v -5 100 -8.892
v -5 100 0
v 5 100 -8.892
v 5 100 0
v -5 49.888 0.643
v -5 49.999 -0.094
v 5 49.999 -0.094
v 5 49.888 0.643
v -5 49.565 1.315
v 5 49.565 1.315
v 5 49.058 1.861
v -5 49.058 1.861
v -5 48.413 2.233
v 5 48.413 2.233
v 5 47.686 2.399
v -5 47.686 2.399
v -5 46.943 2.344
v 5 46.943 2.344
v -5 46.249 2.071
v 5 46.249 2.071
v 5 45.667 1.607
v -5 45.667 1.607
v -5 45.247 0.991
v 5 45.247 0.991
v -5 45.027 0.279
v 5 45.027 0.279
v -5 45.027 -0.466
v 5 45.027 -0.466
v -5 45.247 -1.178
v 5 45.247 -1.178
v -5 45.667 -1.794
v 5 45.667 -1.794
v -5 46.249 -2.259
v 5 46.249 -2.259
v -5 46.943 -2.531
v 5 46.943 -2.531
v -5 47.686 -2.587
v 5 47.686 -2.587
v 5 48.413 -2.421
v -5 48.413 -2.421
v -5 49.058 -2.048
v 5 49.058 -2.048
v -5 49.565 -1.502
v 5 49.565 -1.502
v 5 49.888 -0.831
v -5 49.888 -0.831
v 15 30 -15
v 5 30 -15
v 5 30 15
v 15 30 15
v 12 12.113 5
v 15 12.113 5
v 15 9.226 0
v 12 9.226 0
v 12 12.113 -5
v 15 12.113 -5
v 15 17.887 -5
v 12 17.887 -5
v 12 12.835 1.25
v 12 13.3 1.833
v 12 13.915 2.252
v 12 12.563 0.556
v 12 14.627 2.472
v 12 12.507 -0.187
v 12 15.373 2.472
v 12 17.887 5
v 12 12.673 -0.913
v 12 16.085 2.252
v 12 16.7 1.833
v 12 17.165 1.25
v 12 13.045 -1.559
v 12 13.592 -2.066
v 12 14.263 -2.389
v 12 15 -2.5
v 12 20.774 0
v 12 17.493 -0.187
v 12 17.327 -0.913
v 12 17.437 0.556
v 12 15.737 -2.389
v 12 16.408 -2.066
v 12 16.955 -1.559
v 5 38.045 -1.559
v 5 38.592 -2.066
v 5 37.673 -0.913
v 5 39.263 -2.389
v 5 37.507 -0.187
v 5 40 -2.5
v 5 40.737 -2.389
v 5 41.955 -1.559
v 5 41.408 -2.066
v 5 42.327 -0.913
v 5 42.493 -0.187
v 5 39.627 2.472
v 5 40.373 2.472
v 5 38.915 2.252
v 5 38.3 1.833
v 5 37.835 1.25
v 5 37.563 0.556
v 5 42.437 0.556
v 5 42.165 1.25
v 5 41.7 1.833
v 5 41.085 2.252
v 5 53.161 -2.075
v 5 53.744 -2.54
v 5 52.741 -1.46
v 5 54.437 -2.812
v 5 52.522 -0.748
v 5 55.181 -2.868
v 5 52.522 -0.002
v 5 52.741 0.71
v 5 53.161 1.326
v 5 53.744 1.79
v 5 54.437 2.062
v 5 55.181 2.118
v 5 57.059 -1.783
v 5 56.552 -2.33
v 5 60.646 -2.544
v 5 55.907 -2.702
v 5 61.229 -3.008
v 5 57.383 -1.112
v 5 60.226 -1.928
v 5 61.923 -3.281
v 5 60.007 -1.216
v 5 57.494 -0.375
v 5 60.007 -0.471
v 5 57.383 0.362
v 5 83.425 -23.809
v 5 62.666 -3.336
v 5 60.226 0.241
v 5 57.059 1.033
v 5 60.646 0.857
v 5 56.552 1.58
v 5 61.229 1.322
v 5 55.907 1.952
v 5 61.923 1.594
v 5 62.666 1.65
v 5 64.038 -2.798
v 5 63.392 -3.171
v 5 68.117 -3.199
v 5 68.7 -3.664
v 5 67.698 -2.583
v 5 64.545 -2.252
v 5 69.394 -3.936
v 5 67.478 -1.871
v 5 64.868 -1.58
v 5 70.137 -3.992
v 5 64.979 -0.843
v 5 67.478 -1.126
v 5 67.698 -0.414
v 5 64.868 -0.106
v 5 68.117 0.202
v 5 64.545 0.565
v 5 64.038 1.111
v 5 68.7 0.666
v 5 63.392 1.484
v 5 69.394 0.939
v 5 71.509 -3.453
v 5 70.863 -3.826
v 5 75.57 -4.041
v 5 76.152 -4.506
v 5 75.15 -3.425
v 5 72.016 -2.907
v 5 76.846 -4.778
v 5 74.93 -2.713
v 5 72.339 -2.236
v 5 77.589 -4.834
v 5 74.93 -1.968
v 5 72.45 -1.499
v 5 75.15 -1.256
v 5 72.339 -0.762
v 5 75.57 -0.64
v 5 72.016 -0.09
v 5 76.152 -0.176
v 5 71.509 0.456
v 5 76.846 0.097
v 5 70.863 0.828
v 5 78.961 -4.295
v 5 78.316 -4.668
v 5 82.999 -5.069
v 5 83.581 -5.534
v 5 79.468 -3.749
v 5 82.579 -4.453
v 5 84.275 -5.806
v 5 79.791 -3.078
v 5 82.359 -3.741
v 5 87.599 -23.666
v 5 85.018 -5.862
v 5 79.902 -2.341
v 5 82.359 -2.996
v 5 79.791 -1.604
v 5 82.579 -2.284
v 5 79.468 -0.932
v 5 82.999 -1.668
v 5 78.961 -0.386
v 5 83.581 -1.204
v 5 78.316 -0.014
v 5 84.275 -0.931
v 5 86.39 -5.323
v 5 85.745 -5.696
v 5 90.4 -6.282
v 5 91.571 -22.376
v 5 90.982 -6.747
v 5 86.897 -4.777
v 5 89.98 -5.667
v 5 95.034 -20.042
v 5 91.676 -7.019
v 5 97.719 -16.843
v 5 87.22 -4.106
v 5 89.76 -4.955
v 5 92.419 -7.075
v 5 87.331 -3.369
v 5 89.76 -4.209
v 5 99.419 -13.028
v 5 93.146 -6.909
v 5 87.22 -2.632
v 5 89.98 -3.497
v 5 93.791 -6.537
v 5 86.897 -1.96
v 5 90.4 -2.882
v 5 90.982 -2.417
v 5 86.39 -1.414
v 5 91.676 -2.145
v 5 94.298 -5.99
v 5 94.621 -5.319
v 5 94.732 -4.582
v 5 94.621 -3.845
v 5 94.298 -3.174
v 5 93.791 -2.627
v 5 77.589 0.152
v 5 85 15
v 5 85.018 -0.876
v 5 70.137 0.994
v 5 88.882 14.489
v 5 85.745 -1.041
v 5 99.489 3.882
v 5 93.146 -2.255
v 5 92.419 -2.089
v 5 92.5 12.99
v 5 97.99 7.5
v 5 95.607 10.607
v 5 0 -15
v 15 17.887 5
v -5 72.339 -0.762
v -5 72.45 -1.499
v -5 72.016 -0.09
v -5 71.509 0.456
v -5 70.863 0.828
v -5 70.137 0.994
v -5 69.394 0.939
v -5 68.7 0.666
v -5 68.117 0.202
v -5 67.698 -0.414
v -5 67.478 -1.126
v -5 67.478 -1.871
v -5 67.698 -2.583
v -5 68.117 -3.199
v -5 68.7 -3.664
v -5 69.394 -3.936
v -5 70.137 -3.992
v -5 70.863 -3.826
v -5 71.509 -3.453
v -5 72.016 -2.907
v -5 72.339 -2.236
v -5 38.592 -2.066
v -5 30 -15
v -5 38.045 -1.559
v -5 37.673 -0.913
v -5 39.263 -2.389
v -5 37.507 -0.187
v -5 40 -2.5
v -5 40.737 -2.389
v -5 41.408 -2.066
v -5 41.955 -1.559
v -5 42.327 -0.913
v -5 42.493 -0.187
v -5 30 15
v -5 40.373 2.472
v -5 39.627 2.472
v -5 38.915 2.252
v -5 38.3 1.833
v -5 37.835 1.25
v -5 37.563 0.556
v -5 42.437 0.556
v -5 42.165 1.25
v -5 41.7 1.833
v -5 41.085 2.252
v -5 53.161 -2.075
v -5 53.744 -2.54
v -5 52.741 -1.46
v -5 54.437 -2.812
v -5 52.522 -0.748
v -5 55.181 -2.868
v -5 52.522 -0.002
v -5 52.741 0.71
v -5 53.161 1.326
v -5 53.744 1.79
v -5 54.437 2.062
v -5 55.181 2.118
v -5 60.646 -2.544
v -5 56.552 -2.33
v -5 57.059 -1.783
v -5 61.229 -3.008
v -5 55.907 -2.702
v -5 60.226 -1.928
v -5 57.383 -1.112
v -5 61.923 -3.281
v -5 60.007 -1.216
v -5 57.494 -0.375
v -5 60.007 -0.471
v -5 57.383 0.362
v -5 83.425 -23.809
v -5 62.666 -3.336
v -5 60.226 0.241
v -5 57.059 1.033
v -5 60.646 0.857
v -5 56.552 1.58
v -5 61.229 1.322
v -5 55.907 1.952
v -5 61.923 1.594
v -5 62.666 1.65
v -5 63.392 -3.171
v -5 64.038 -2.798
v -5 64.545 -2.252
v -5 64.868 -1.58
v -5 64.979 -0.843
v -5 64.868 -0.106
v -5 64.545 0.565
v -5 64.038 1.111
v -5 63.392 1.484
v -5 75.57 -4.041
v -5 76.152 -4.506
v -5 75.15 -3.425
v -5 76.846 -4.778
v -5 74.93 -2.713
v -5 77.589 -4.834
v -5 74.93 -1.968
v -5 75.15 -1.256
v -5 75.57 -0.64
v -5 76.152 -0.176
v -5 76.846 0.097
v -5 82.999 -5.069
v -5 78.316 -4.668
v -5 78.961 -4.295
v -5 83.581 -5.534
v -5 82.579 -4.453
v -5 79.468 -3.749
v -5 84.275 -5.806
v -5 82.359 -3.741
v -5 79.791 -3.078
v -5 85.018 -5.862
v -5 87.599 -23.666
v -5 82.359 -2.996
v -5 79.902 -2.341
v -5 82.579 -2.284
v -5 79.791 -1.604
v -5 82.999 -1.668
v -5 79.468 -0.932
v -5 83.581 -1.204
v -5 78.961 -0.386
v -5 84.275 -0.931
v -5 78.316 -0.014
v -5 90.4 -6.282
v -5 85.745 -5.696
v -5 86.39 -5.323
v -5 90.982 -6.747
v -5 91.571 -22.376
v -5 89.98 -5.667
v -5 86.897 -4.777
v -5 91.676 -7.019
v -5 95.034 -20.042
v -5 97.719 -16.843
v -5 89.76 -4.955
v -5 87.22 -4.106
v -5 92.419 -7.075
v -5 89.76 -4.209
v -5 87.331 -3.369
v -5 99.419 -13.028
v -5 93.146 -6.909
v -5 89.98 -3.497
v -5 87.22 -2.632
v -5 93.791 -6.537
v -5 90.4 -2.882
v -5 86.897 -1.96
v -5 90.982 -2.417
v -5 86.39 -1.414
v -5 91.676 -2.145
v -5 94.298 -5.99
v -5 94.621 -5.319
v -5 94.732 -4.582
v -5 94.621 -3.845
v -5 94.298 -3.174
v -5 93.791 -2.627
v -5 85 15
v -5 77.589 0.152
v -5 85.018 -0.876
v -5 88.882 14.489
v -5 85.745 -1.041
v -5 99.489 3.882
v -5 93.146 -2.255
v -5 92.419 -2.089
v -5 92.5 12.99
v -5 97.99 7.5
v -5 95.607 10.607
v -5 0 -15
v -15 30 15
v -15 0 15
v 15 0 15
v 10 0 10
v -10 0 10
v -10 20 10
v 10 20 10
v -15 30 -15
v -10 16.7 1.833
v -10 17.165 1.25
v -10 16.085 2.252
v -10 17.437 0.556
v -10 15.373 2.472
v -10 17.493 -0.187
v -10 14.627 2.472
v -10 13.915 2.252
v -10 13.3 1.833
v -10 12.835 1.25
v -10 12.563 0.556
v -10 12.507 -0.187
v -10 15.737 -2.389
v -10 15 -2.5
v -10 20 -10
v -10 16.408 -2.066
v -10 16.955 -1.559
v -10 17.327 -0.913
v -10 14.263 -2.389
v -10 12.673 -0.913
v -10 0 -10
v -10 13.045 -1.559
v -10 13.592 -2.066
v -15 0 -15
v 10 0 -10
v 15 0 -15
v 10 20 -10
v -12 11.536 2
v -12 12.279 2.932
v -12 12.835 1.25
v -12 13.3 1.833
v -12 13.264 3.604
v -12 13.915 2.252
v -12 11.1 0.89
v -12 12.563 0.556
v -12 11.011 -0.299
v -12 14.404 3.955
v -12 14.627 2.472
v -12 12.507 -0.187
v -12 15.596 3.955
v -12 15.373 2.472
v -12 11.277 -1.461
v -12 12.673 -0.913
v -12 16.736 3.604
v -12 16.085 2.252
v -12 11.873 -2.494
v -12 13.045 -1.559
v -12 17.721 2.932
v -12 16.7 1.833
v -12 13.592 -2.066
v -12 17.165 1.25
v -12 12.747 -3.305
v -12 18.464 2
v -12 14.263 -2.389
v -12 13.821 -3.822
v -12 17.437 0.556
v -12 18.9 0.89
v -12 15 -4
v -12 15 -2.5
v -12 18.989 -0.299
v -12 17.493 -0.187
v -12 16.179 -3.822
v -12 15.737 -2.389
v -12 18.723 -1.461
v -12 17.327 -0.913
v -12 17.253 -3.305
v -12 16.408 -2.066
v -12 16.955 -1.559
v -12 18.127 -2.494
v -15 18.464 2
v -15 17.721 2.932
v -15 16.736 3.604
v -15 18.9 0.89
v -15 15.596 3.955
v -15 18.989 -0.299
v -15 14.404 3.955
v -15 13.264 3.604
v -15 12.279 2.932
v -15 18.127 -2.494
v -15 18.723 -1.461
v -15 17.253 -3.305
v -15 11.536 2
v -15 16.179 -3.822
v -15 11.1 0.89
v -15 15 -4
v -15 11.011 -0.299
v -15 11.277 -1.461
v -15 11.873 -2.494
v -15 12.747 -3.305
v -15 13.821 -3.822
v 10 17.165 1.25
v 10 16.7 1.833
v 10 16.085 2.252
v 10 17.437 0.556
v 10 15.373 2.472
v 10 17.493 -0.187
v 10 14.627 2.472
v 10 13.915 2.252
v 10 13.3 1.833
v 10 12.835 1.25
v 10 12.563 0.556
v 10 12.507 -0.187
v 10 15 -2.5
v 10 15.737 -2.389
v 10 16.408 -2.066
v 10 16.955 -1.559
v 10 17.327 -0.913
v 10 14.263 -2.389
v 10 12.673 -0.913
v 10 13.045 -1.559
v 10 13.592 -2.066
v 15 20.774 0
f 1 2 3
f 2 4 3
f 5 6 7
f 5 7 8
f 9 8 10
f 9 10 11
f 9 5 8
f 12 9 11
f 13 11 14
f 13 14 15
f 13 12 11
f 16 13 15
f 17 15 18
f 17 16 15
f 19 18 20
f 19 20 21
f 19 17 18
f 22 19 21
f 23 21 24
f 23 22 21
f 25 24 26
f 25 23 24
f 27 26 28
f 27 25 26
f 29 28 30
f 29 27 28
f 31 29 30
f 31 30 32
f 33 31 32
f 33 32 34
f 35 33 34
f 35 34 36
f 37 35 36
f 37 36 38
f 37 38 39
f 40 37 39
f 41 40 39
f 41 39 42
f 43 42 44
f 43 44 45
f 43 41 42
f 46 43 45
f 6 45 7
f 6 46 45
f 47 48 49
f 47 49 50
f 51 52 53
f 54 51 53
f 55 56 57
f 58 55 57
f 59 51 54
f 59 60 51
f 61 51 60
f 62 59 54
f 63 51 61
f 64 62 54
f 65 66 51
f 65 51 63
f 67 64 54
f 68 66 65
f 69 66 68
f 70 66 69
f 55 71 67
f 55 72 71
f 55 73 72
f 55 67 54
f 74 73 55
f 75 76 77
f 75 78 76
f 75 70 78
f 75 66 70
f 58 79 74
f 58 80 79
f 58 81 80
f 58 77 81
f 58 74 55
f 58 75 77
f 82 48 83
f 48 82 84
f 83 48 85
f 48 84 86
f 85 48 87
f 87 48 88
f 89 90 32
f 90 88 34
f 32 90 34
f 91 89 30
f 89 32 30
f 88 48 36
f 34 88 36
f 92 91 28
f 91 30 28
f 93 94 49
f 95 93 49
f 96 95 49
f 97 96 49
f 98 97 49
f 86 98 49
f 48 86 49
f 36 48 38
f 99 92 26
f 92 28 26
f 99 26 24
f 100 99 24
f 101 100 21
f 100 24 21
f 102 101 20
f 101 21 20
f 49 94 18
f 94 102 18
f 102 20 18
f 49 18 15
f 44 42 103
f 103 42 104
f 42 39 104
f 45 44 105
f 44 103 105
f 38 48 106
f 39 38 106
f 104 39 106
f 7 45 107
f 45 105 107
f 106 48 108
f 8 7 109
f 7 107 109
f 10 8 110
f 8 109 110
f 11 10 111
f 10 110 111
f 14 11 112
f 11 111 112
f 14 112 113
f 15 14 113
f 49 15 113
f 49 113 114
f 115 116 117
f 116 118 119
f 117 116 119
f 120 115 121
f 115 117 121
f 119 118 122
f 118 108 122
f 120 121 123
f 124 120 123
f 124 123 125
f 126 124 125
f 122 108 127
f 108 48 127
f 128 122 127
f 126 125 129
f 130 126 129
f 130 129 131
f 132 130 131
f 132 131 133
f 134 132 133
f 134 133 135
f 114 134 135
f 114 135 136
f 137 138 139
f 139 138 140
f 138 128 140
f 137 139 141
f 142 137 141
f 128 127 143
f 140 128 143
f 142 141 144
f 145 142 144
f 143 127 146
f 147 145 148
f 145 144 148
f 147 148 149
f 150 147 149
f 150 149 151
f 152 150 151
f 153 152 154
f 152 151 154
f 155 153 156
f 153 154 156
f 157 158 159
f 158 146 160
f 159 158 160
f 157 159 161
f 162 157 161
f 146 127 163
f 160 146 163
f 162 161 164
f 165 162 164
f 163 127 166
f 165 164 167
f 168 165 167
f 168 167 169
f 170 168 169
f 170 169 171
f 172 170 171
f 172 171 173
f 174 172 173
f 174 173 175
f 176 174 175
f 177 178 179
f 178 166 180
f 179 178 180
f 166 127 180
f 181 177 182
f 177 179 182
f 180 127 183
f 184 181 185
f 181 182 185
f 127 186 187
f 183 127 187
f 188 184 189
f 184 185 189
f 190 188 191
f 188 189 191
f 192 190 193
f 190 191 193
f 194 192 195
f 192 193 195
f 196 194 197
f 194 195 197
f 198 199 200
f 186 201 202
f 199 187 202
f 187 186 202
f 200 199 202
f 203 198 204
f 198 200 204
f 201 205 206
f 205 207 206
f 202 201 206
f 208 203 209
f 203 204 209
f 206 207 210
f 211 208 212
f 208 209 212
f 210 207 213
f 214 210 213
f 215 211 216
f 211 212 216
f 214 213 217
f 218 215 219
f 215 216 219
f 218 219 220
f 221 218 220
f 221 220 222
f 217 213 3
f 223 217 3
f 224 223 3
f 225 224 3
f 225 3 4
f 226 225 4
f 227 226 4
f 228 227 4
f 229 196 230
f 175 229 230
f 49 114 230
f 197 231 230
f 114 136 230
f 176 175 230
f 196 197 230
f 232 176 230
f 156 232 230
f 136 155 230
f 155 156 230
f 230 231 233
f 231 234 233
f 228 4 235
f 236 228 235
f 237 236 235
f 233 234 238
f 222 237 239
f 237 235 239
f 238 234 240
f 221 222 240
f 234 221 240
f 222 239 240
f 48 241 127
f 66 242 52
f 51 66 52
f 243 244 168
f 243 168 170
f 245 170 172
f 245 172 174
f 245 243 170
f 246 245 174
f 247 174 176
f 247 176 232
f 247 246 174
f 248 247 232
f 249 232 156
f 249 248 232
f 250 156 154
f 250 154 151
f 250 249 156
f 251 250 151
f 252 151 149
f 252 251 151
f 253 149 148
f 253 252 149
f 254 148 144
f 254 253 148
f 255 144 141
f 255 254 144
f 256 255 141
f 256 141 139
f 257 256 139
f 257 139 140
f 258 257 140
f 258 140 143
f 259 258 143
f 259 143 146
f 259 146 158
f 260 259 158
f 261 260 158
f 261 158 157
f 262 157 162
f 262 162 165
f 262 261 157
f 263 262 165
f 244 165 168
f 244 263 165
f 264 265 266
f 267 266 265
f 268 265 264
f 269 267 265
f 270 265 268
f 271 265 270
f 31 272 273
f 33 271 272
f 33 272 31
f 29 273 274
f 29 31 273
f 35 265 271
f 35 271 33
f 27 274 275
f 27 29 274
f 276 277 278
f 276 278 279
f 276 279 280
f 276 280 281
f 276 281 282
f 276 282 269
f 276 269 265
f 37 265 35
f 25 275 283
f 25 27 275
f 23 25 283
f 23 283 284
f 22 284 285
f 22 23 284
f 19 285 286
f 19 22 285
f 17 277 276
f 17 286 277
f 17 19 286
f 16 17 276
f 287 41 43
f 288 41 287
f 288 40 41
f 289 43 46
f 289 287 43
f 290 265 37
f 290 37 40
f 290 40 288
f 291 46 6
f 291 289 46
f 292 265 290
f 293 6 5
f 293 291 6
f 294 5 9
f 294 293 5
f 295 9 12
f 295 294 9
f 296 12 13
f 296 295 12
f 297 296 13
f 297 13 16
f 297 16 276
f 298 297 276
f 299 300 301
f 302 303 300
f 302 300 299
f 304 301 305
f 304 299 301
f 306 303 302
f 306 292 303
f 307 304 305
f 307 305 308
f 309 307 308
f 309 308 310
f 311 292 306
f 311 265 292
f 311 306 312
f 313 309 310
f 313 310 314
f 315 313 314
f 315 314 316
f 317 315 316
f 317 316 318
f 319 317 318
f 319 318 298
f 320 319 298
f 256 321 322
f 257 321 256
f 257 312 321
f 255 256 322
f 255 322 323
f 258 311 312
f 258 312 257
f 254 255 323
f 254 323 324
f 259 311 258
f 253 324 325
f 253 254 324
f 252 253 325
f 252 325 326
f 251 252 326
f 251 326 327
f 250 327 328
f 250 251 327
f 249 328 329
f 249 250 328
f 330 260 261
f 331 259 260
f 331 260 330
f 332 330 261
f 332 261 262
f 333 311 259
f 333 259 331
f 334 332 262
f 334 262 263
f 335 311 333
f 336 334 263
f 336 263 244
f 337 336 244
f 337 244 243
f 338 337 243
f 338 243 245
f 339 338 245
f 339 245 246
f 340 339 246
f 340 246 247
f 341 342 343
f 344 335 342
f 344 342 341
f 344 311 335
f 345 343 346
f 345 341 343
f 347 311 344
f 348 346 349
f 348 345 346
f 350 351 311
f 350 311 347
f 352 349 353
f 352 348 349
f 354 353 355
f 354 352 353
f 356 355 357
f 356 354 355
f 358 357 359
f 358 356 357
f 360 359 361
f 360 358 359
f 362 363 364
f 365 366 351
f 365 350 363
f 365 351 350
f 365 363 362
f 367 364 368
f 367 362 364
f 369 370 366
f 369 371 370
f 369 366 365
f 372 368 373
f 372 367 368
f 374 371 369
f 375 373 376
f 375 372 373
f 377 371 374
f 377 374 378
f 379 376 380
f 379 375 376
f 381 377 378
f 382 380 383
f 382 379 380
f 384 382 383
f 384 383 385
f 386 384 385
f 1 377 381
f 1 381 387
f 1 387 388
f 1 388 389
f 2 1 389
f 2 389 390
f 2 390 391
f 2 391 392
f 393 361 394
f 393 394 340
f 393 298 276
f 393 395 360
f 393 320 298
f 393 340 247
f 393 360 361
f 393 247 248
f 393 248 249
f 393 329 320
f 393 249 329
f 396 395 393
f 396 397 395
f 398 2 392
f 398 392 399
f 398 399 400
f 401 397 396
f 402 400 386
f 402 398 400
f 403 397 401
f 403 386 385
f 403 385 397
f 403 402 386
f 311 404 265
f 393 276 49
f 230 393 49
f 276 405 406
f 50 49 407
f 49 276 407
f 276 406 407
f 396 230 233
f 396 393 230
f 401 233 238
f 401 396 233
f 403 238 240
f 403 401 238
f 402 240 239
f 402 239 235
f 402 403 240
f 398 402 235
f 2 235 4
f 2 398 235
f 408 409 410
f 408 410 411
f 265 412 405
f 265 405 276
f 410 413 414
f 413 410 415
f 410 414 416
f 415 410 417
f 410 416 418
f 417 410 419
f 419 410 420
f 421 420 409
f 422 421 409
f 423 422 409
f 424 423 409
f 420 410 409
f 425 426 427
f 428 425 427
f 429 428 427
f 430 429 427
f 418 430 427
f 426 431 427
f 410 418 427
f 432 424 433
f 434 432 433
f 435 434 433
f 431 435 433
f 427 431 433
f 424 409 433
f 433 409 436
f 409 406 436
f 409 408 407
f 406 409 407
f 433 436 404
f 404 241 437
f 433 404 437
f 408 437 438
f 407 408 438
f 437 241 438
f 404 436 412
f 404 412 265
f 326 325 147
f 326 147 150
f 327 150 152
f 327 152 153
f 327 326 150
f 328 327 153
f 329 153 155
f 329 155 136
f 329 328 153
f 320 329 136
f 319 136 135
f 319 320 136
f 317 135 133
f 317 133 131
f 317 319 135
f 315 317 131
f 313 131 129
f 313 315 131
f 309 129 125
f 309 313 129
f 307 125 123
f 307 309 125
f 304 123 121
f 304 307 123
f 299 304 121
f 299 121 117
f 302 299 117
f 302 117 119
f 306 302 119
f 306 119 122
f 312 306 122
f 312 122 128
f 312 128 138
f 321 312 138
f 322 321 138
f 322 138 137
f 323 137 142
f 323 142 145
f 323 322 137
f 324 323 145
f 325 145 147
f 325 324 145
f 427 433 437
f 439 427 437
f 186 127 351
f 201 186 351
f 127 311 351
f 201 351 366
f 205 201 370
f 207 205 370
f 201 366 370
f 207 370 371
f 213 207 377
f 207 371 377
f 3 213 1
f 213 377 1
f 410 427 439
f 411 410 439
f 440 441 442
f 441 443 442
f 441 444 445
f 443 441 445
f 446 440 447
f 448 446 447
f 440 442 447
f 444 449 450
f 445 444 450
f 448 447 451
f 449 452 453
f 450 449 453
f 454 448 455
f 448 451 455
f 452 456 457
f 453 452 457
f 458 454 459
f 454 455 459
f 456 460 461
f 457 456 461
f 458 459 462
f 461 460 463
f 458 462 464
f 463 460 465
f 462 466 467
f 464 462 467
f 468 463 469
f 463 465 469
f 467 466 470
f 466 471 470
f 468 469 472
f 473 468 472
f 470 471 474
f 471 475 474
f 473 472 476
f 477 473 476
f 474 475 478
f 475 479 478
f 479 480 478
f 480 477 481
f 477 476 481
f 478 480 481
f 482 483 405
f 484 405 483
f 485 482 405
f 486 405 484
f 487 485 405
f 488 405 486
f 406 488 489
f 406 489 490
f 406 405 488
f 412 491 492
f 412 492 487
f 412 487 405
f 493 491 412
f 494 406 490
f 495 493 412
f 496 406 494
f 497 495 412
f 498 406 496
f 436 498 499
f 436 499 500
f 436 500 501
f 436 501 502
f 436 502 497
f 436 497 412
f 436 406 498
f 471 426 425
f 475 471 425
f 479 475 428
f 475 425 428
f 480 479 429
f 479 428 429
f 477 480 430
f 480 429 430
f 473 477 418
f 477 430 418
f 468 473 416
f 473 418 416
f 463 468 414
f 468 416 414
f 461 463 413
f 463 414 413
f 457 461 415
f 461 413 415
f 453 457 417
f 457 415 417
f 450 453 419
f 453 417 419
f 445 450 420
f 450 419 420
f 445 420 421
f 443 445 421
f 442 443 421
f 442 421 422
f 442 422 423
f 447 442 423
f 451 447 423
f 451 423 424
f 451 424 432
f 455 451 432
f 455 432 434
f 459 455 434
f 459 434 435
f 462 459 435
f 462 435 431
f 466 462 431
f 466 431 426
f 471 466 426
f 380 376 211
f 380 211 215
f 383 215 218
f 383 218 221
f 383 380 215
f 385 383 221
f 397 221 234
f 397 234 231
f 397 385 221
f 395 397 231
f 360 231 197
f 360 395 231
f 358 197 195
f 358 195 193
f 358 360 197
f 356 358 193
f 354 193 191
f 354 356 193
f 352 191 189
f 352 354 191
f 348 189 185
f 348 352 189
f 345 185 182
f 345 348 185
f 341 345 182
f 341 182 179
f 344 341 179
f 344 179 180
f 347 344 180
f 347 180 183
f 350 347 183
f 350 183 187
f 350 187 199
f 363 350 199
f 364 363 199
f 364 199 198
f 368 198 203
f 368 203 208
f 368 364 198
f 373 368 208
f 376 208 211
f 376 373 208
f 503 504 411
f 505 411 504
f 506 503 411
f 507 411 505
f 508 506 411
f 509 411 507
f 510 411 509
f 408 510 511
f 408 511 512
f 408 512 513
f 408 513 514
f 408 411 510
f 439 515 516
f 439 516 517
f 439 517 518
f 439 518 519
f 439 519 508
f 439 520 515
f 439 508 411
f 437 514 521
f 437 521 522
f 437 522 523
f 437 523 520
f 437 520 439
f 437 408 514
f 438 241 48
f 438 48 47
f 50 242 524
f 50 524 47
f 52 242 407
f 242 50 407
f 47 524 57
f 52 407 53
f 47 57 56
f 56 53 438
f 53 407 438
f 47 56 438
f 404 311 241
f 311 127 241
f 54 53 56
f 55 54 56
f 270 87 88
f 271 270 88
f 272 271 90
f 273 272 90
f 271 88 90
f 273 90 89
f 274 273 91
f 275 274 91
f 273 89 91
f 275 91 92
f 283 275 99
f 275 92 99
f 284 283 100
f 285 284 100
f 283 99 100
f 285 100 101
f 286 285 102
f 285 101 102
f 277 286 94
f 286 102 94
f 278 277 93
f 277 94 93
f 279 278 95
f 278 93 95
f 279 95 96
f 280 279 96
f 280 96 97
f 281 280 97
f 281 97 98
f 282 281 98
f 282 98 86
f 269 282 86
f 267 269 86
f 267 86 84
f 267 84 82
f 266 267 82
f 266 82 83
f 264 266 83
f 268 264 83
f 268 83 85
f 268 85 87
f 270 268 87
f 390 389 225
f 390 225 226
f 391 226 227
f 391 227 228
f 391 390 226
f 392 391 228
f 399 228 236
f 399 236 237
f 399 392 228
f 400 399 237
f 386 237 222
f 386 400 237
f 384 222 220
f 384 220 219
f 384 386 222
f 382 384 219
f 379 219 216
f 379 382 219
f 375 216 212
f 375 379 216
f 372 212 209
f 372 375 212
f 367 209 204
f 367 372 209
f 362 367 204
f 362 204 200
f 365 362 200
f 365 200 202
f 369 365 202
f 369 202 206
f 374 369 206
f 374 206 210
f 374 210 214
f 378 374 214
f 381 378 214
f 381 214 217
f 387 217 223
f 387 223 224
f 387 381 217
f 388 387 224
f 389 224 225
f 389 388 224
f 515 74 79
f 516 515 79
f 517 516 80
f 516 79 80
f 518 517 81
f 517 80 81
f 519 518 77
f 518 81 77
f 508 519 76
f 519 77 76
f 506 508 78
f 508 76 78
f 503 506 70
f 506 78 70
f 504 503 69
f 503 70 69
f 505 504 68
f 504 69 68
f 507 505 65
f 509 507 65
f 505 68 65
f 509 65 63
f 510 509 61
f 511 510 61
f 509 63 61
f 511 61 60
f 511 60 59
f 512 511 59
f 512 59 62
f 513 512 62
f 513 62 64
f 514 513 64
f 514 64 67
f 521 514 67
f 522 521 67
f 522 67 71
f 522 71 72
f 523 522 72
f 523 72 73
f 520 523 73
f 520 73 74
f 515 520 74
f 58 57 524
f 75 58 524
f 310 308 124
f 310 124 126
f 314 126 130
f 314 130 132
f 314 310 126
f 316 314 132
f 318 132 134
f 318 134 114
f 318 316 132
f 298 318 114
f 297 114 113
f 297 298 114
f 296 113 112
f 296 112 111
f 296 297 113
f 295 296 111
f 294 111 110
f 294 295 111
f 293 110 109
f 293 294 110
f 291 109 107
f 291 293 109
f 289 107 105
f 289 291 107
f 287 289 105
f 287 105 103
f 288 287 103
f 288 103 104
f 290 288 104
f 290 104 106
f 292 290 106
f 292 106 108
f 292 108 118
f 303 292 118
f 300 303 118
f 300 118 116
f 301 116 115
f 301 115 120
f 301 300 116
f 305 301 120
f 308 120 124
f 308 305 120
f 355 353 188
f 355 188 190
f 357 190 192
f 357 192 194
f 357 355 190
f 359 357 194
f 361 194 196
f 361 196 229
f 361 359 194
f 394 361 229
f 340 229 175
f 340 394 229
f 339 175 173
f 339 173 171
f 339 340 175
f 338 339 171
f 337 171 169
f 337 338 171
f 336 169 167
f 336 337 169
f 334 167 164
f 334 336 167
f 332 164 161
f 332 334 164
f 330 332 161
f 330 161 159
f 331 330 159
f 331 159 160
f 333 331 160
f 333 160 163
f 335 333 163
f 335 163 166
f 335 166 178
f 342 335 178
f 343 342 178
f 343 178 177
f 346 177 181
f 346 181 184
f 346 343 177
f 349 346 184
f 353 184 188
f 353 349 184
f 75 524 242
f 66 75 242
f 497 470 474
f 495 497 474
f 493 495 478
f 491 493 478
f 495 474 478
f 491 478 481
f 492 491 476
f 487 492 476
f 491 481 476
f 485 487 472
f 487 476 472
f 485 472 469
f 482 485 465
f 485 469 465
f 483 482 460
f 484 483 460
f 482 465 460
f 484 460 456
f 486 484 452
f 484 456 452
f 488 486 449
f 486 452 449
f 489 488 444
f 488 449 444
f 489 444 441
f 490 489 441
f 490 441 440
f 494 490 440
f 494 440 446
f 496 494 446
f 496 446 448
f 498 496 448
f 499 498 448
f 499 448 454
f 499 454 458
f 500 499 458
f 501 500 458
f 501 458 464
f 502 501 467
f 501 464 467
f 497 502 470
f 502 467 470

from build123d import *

# Parameters (mm, degrees)
SKETCH1_W             = 30
SKETCH1_H             = 30
SKETCH1_W_2           = 20
SKETCH1_H_2           = 20
BOSS_EXTRUDE1_DEPTH   = 20
BOSS_EXTRUDE2_START   = 20
SKETCH1_2_W           = 30
SKETCH1_2_H           = 30
SKETCH1_2_W_2         = 20
SKETCH1_2_H_2         = 20
BOSS_EXTRUDE2_DEPTH   = 10
SKETCH3_R             = 2.5
CUT_EXTRUDE1_DEPTH    = 46
SKETCH3_3_R           = 4
SKETCH3_3_R_2         = 2.5
CUT_EXTRUDE2_DEPTH    = 3
CUT_EXTRUDE3_START    = -27
SKETCH3_4_R           = 4
SKETCH3_4_R_2         = 2.5
CUT_EXTRUDE3_DEPTH    = 3
BOSS_EXTRUDE4_DEPTH   = 5
FILLET2_R             = 15
SKETCH7_R             = 2.5
CUT_EXTRUDE5_DEPTH    = 105.74180253
CRVPATTERN1_START     = -5
CRVPATTERN1_OUTLINE_R = 2.5
CRVPATTERN1_DEPTH     = 10


# Read off the part's stored shape, not the designer's step: CrvPattern1
with BuildPart() as part:
    # Sketch1 → Boss-Extrude1 (new body)
    with BuildSketch(Plane(origin=(0, 0, 0), x_dir=(1, 0, 0), z_dir=(0, 1, 0))):
        Rectangle(SKETCH1_W, SKETCH1_H)
        Rectangle(SKETCH1_W_2, SKETCH1_H_2, mode=Mode.SUBTRACT)
    extrude(amount=BOSS_EXTRUDE1_DEPTH)

    # Sketch1<2> → Boss-Extrude2 (add)
    # profile 1 of 2: a face of its own
    with BuildSketch(Plane(origin=(0, 0, 0), x_dir=(1, 0, 0), z_dir=(0, 1, 0)).offset(BOSS_EXTRUDE2_START)):
        Rectangle(SKETCH1_2_W, SKETCH1_2_H)
        Rectangle(SKETCH1_2_W_2, SKETCH1_2_H_2, mode=Mode.SUBTRACT)
    # profile 2 of 2: a face of its own
    with BuildSketch(Plane(origin=(0, 0, 0), x_dir=(1, 0, 0), z_dir=(0, 1, 0)).offset(BOSS_EXTRUDE2_START)):
        Rectangle(SKETCH1_2_W_2, SKETCH1_2_H_2)
    extrude(amount=BOSS_EXTRUDE2_DEPTH)

    # Sketch3 → Cut-Extrude1 (cut, through all)
    with BuildSketch(Plane(origin=(15, 0, 0), x_dir=(0, 0, -1), z_dir=(1, 0, 0))):
        with Locations((0, 15)):
            Circle(SKETCH3_R)
    extrude(amount=-CUT_EXTRUDE1_DEPTH, mode=Mode.SUBTRACT)

    # Sketch3<3> → Cut-Extrude2 (cut)
    # profile 1 of 2: a face of its own
    with BuildSketch(Plane(origin=(15, 0, 0), x_dir=(0, 0, -1), z_dir=(1, 0, 0))):
        Polygon((-5, 17.886751346), (-5, 12.113248654), (0, 9.226497308), (5, 12.113248654), (5, 17.886751346), (0, 20.773502692), align=None)
        with Locations((0, 15)):
            Circle(SKETCH3_3_R, mode=Mode.SUBTRACT)
    # profile 2 of 2: a face of its own
    with BuildSketch(Plane(origin=(15, 0, 0), x_dir=(0, 0, -1), z_dir=(1, 0, 0))):
        with Locations((0, 15)):
            Circle(SKETCH3_3_R)
        with Locations((0, 15)):
            Circle(SKETCH3_3_R_2, mode=Mode.SUBTRACT)
    extrude(amount=-CUT_EXTRUDE2_DEPTH, mode=Mode.SUBTRACT)

    # Sketch3<4> → Cut-Extrude3 (cut)
    with BuildSketch(Plane(origin=(15, 0, 0), x_dir=(0, 0, -1), z_dir=(1, 0, 0)).offset(CUT_EXTRUDE3_START)):
        with Locations((0, 15)):
            Circle(SKETCH3_4_R)
        with Locations((0, 15)):
            Circle(SKETCH3_4_R_2, mode=Mode.SUBTRACT)
    extrude(amount=-CUT_EXTRUDE3_DEPTH, mode=Mode.SUBTRACT)

    # Sketch6 → Boss-Extrude4 (add, symmetric)
    with BuildSketch(Plane(origin=(0, 0, 0), x_dir=(0, 0, -1), z_dir=(1, 0, 0))):
        Polygon((-15, 30), (-15, 100), (25.559724605, 100), (15, 0), (15, 30), align=None)
    extrude(amount=BOSS_EXTRUDE4_DEPTH, both=True)

    # Fillet2
    fillet2_edges = [part.edges().sort_by_distance(p)[0] for p in [
        (0, 100, -25.559724605),
        (0, 100, 15),
    ]]
    fillet(fillet2_edges, radius=FILLET2_R)

    # Sketch7 → Cut-Extrude5 (cut, through all)
    with BuildSketch(Plane(origin=(5, 0, 0), x_dir=(0, 0, -1), z_dir=(1, 0, 0))):
        with Locations((0, 40)):
            Circle(SKETCH7_R)
    extrude(amount=-CUT_EXTRUDE5_DEPTH, mode=Mode.SUBTRACT)

    # CrvPattern1 outline → CrvPattern1 (cut)
    with BuildSketch(Plane.YZ.offset(CRVPATTERN1_START)):
        with Locations((47.499218774, -0.093745117)):
            Circle(CRVPATTERN1_OUTLINE_R)
        with Locations((92.232441278, -4.582038329)):
            Circle(CRVPATTERN1_OUTLINE_R)
        with Locations((84.831439742, -3.368676619)):
            Circle(CRVPATTERN1_OUTLINE_R)
        with Locations((77.402420016, -2.340699831)):
            Circle(CRVPATTERN1_OUTLINE_R)
        with Locations((69.950024994, -1.498750417)):
            Circle(CRVPATTERN1_OUTLINE_R)
        with Locations((62.478912182, -0.843354566)):
            Circle(CRVPATTERN1_OUTLINE_R)
        with Locations((54.993750781, -0.374921882)):
            Circle(CRVPATTERN1_OUTLINE_R)
    extrude(amount=CRVPATTERN1_DEPTH, mode=Mode.SUBTRACT)


solid = part.part
